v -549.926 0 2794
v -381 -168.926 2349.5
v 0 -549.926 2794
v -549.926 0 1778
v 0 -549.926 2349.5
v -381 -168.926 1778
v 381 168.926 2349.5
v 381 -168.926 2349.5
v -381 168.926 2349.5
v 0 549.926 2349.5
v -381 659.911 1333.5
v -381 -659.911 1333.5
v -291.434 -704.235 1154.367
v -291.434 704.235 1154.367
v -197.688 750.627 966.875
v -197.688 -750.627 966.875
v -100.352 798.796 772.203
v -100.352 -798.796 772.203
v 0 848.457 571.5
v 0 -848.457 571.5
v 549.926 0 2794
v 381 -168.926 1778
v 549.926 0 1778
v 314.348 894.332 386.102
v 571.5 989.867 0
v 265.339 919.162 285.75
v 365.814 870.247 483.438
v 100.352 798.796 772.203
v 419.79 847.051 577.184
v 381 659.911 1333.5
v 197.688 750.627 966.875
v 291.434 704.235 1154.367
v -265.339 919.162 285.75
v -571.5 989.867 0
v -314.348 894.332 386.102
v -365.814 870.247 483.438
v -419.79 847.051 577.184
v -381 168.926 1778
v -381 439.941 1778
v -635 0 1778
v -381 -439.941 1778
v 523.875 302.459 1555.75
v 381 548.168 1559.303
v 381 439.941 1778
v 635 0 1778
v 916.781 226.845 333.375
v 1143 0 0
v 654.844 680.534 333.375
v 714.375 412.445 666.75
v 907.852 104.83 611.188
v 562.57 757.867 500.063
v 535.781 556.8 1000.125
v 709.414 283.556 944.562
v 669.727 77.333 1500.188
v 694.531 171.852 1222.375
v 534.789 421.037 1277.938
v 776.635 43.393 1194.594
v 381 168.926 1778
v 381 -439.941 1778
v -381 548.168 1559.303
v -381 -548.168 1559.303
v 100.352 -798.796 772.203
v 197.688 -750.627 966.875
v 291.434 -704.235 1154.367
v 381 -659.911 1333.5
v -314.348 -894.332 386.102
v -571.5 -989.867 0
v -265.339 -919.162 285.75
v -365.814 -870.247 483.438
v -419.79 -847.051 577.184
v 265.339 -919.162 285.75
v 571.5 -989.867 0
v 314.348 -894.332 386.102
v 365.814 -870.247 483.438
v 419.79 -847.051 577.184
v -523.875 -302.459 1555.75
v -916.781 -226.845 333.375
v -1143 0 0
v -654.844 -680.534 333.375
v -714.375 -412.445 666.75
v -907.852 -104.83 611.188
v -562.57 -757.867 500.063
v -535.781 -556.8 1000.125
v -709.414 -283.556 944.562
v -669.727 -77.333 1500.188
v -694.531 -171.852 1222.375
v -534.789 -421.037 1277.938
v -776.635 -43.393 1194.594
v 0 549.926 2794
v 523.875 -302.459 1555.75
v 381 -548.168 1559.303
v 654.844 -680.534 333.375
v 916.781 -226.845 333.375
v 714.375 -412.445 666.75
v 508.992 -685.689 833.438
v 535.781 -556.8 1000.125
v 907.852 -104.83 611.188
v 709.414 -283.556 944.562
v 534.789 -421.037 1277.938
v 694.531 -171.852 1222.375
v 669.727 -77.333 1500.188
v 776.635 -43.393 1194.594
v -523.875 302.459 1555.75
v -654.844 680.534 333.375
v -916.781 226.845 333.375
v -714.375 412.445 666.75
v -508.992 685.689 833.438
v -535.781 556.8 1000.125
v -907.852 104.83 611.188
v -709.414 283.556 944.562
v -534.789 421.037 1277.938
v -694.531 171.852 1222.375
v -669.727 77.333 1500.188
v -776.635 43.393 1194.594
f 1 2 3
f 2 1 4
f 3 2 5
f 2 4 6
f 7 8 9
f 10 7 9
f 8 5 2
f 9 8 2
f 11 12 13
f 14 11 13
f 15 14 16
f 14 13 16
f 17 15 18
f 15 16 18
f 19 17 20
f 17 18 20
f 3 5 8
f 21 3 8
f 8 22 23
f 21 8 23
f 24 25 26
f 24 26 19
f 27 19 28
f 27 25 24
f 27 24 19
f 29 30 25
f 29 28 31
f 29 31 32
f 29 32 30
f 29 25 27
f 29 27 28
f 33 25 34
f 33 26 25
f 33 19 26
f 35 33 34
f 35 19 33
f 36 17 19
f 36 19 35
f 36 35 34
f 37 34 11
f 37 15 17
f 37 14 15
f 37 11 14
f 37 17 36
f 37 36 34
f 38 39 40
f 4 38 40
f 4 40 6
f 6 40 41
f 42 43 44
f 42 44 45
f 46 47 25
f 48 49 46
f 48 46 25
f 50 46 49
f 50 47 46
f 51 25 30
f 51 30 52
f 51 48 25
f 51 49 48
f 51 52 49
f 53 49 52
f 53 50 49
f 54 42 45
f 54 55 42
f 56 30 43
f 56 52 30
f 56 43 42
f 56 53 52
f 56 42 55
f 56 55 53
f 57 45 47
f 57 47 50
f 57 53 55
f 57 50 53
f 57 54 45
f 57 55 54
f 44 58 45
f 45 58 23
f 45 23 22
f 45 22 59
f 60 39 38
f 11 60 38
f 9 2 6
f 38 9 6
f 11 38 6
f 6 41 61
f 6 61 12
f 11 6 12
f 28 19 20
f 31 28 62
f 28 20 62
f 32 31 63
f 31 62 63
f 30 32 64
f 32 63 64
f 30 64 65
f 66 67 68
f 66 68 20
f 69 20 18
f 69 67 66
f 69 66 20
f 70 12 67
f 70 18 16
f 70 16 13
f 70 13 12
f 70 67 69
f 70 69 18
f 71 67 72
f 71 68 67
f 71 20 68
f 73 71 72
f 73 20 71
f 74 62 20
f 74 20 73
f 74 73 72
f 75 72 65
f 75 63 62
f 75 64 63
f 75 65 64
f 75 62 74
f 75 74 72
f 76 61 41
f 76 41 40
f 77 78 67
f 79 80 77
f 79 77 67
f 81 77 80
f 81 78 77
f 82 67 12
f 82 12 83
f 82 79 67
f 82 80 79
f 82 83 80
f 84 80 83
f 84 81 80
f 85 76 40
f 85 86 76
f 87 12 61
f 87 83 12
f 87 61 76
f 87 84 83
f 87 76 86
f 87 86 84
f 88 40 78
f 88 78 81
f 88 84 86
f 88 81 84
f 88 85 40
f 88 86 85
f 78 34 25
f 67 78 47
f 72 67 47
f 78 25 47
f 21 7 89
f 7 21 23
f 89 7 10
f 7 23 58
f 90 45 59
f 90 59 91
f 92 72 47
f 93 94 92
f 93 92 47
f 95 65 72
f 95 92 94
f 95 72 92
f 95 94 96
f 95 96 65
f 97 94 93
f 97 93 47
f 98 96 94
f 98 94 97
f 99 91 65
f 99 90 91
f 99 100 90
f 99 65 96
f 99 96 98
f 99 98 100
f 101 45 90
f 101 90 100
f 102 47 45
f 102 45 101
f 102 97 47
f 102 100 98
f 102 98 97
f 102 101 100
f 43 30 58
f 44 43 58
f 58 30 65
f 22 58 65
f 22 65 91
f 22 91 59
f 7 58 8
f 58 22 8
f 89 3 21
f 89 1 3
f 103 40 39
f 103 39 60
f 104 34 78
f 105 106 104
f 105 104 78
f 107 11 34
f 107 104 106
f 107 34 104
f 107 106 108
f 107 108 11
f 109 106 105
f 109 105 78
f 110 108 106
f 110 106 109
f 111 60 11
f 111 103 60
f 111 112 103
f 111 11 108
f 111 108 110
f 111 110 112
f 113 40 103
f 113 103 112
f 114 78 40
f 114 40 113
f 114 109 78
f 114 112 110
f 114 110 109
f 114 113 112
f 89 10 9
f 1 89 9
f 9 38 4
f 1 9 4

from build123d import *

# Parameters (mm, degrees)
F5_DEPTH = 1016
F7_DEPTH = 1188.72


with BuildPart() as f3:
    # F0 (on Top) → F3 section 0
    with BuildSketch(Plane.XY):
        Polygon((-571.5, 989.867037), (-1143, 0), (-571.5, -989.867037), (571.5, -989.867037), (1143, 0), (571.5, 989.867037), align=None)
    # F2 (on offset) → F3 section 1
    with BuildSketch(Plane.XY.offset(1778)):
        Polygon((317.5, -549.926131), (635, 0), (317.5, 549.926131), (-317.5, 549.926131), (-635, 0), (-317.5, -549.926131), align=None)
    loft()

    # F4 (on face) → F5 (join)
    with BuildSketch(Plane.XY.offset(1778)):
        Polygon((0, -549.926131), (549.926131, 0), (0, 549.926131), (-549.926131, 0), align=None)
    extrude(amount=F5_DEPTH)

    # F6 (on Front) → F7 (cut, symmetric)
    with BuildSketch(Plane.XZ):
        Polygon((-381, 2349.5), (-381, 1333.5), (0, 571.5), (381, 1333.5), (381, 2349.5), align=None)
    extrude(amount=F7_DEPTH, both=True, mode=Mode.SUBTRACT)


solid = f3.part
